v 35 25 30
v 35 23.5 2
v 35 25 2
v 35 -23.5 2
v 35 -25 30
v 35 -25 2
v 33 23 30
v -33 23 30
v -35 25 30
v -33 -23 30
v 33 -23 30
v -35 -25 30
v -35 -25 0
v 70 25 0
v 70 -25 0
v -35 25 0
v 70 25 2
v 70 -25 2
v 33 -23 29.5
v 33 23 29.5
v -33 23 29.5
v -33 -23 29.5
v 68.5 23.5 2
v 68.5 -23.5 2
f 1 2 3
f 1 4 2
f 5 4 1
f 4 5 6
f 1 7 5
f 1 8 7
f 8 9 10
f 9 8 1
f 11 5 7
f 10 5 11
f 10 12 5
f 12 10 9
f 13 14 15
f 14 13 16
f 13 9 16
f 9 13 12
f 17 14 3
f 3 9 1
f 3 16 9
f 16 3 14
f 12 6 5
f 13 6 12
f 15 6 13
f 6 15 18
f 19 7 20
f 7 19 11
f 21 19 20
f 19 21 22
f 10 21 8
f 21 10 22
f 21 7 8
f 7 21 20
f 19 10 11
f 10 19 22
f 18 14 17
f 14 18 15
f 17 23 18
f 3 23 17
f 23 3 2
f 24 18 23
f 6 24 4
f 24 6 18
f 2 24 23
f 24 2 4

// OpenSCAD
// Two-part enclosure for a small electronics board (e.g. Arduino-based temperature logger)
// Print orientation: box stands on the bed, lid lies flat on the bed upside down.
// The two parts are placed side by side with a 10 mm gap so they print together.

$fn = 64;

// ---------------- Dimensions (mm) ----------------
box_x      = 70;    // box outer length (X)
box_y      = 50;    // box outer width (Y)
box_z      = 30;    // box outer height (Z)
wall       = 2;     // box wall thickness (sides and floor)

gap        = 10;    // gap between box and lid along X

plate_x    = 70;    // lid plate length (X)
plate_y    = 50;    // lid plate width (Y)
plate_t    = 2;     // lid plate thickness (Z)

lip_h      = 4;     // lid lip height (Z)
lip_w      = 65.6;  // lid lip outer length (X)
lip_d      = 45.6;  // lid lip outer width (Y)
clearance  = 0.2;   // clearance between lip outer size and box opening

eps        = 0.5;   // overcut for clean boolean differences

// Derived
box_inner_x = box_x - 2 * wall;   // 66
box_inner_y = box_y - 2 * wall;   // 46
box_opening = [box_inner_x, box_inner_y];  // opening size (X x Y)

// Lip check: 65.6 + 2*0.2 = 66.0 -> 1.0 mm clearance on each side
assert(abs(lip_w + 2 * clearance - box_inner_x) < 0.001, "Lip length clearance mismatch");
assert(abs(lip_d + 2 * clearance - box_inner_y) < 0.001, "Lip width clearance mismatch");

// ---------------- Model ----------------
union() {
    // Part 1: Box (open top)
    translate([-box_x / 2, -box_y / 2, 0])
        difference() {
            cube([box_x, box_y, box_z]);
            translate([wall, wall, box_z - eps])
                cube([box_inner_x, box_inner_y, eps]);  // open-top cut
        }

    // Part 2: Lid (printed upside down)
    translate([(box_x - plate_x) / 2, -plate_y / 2, 0])
        difference() {
            // Base plate
            cube([plate_x, plate_y, plate_t]);
            // Lip: wall on top of the plate, extending toward +Z
            translate([(plate_x - lip_w) / 2, (plate_y - lip_d) / 2, plate_t])
                cube([lip_w, lip_d, lip_h]);
            // Cut the lip so it slides into the box opening with clearance
            translate([wall - eps, wall - eps, plate_t])
                cube([box_opening[0] + 2 * eps, box_opening[1] + 2 * eps, lip_h + eps]);
        }
}
